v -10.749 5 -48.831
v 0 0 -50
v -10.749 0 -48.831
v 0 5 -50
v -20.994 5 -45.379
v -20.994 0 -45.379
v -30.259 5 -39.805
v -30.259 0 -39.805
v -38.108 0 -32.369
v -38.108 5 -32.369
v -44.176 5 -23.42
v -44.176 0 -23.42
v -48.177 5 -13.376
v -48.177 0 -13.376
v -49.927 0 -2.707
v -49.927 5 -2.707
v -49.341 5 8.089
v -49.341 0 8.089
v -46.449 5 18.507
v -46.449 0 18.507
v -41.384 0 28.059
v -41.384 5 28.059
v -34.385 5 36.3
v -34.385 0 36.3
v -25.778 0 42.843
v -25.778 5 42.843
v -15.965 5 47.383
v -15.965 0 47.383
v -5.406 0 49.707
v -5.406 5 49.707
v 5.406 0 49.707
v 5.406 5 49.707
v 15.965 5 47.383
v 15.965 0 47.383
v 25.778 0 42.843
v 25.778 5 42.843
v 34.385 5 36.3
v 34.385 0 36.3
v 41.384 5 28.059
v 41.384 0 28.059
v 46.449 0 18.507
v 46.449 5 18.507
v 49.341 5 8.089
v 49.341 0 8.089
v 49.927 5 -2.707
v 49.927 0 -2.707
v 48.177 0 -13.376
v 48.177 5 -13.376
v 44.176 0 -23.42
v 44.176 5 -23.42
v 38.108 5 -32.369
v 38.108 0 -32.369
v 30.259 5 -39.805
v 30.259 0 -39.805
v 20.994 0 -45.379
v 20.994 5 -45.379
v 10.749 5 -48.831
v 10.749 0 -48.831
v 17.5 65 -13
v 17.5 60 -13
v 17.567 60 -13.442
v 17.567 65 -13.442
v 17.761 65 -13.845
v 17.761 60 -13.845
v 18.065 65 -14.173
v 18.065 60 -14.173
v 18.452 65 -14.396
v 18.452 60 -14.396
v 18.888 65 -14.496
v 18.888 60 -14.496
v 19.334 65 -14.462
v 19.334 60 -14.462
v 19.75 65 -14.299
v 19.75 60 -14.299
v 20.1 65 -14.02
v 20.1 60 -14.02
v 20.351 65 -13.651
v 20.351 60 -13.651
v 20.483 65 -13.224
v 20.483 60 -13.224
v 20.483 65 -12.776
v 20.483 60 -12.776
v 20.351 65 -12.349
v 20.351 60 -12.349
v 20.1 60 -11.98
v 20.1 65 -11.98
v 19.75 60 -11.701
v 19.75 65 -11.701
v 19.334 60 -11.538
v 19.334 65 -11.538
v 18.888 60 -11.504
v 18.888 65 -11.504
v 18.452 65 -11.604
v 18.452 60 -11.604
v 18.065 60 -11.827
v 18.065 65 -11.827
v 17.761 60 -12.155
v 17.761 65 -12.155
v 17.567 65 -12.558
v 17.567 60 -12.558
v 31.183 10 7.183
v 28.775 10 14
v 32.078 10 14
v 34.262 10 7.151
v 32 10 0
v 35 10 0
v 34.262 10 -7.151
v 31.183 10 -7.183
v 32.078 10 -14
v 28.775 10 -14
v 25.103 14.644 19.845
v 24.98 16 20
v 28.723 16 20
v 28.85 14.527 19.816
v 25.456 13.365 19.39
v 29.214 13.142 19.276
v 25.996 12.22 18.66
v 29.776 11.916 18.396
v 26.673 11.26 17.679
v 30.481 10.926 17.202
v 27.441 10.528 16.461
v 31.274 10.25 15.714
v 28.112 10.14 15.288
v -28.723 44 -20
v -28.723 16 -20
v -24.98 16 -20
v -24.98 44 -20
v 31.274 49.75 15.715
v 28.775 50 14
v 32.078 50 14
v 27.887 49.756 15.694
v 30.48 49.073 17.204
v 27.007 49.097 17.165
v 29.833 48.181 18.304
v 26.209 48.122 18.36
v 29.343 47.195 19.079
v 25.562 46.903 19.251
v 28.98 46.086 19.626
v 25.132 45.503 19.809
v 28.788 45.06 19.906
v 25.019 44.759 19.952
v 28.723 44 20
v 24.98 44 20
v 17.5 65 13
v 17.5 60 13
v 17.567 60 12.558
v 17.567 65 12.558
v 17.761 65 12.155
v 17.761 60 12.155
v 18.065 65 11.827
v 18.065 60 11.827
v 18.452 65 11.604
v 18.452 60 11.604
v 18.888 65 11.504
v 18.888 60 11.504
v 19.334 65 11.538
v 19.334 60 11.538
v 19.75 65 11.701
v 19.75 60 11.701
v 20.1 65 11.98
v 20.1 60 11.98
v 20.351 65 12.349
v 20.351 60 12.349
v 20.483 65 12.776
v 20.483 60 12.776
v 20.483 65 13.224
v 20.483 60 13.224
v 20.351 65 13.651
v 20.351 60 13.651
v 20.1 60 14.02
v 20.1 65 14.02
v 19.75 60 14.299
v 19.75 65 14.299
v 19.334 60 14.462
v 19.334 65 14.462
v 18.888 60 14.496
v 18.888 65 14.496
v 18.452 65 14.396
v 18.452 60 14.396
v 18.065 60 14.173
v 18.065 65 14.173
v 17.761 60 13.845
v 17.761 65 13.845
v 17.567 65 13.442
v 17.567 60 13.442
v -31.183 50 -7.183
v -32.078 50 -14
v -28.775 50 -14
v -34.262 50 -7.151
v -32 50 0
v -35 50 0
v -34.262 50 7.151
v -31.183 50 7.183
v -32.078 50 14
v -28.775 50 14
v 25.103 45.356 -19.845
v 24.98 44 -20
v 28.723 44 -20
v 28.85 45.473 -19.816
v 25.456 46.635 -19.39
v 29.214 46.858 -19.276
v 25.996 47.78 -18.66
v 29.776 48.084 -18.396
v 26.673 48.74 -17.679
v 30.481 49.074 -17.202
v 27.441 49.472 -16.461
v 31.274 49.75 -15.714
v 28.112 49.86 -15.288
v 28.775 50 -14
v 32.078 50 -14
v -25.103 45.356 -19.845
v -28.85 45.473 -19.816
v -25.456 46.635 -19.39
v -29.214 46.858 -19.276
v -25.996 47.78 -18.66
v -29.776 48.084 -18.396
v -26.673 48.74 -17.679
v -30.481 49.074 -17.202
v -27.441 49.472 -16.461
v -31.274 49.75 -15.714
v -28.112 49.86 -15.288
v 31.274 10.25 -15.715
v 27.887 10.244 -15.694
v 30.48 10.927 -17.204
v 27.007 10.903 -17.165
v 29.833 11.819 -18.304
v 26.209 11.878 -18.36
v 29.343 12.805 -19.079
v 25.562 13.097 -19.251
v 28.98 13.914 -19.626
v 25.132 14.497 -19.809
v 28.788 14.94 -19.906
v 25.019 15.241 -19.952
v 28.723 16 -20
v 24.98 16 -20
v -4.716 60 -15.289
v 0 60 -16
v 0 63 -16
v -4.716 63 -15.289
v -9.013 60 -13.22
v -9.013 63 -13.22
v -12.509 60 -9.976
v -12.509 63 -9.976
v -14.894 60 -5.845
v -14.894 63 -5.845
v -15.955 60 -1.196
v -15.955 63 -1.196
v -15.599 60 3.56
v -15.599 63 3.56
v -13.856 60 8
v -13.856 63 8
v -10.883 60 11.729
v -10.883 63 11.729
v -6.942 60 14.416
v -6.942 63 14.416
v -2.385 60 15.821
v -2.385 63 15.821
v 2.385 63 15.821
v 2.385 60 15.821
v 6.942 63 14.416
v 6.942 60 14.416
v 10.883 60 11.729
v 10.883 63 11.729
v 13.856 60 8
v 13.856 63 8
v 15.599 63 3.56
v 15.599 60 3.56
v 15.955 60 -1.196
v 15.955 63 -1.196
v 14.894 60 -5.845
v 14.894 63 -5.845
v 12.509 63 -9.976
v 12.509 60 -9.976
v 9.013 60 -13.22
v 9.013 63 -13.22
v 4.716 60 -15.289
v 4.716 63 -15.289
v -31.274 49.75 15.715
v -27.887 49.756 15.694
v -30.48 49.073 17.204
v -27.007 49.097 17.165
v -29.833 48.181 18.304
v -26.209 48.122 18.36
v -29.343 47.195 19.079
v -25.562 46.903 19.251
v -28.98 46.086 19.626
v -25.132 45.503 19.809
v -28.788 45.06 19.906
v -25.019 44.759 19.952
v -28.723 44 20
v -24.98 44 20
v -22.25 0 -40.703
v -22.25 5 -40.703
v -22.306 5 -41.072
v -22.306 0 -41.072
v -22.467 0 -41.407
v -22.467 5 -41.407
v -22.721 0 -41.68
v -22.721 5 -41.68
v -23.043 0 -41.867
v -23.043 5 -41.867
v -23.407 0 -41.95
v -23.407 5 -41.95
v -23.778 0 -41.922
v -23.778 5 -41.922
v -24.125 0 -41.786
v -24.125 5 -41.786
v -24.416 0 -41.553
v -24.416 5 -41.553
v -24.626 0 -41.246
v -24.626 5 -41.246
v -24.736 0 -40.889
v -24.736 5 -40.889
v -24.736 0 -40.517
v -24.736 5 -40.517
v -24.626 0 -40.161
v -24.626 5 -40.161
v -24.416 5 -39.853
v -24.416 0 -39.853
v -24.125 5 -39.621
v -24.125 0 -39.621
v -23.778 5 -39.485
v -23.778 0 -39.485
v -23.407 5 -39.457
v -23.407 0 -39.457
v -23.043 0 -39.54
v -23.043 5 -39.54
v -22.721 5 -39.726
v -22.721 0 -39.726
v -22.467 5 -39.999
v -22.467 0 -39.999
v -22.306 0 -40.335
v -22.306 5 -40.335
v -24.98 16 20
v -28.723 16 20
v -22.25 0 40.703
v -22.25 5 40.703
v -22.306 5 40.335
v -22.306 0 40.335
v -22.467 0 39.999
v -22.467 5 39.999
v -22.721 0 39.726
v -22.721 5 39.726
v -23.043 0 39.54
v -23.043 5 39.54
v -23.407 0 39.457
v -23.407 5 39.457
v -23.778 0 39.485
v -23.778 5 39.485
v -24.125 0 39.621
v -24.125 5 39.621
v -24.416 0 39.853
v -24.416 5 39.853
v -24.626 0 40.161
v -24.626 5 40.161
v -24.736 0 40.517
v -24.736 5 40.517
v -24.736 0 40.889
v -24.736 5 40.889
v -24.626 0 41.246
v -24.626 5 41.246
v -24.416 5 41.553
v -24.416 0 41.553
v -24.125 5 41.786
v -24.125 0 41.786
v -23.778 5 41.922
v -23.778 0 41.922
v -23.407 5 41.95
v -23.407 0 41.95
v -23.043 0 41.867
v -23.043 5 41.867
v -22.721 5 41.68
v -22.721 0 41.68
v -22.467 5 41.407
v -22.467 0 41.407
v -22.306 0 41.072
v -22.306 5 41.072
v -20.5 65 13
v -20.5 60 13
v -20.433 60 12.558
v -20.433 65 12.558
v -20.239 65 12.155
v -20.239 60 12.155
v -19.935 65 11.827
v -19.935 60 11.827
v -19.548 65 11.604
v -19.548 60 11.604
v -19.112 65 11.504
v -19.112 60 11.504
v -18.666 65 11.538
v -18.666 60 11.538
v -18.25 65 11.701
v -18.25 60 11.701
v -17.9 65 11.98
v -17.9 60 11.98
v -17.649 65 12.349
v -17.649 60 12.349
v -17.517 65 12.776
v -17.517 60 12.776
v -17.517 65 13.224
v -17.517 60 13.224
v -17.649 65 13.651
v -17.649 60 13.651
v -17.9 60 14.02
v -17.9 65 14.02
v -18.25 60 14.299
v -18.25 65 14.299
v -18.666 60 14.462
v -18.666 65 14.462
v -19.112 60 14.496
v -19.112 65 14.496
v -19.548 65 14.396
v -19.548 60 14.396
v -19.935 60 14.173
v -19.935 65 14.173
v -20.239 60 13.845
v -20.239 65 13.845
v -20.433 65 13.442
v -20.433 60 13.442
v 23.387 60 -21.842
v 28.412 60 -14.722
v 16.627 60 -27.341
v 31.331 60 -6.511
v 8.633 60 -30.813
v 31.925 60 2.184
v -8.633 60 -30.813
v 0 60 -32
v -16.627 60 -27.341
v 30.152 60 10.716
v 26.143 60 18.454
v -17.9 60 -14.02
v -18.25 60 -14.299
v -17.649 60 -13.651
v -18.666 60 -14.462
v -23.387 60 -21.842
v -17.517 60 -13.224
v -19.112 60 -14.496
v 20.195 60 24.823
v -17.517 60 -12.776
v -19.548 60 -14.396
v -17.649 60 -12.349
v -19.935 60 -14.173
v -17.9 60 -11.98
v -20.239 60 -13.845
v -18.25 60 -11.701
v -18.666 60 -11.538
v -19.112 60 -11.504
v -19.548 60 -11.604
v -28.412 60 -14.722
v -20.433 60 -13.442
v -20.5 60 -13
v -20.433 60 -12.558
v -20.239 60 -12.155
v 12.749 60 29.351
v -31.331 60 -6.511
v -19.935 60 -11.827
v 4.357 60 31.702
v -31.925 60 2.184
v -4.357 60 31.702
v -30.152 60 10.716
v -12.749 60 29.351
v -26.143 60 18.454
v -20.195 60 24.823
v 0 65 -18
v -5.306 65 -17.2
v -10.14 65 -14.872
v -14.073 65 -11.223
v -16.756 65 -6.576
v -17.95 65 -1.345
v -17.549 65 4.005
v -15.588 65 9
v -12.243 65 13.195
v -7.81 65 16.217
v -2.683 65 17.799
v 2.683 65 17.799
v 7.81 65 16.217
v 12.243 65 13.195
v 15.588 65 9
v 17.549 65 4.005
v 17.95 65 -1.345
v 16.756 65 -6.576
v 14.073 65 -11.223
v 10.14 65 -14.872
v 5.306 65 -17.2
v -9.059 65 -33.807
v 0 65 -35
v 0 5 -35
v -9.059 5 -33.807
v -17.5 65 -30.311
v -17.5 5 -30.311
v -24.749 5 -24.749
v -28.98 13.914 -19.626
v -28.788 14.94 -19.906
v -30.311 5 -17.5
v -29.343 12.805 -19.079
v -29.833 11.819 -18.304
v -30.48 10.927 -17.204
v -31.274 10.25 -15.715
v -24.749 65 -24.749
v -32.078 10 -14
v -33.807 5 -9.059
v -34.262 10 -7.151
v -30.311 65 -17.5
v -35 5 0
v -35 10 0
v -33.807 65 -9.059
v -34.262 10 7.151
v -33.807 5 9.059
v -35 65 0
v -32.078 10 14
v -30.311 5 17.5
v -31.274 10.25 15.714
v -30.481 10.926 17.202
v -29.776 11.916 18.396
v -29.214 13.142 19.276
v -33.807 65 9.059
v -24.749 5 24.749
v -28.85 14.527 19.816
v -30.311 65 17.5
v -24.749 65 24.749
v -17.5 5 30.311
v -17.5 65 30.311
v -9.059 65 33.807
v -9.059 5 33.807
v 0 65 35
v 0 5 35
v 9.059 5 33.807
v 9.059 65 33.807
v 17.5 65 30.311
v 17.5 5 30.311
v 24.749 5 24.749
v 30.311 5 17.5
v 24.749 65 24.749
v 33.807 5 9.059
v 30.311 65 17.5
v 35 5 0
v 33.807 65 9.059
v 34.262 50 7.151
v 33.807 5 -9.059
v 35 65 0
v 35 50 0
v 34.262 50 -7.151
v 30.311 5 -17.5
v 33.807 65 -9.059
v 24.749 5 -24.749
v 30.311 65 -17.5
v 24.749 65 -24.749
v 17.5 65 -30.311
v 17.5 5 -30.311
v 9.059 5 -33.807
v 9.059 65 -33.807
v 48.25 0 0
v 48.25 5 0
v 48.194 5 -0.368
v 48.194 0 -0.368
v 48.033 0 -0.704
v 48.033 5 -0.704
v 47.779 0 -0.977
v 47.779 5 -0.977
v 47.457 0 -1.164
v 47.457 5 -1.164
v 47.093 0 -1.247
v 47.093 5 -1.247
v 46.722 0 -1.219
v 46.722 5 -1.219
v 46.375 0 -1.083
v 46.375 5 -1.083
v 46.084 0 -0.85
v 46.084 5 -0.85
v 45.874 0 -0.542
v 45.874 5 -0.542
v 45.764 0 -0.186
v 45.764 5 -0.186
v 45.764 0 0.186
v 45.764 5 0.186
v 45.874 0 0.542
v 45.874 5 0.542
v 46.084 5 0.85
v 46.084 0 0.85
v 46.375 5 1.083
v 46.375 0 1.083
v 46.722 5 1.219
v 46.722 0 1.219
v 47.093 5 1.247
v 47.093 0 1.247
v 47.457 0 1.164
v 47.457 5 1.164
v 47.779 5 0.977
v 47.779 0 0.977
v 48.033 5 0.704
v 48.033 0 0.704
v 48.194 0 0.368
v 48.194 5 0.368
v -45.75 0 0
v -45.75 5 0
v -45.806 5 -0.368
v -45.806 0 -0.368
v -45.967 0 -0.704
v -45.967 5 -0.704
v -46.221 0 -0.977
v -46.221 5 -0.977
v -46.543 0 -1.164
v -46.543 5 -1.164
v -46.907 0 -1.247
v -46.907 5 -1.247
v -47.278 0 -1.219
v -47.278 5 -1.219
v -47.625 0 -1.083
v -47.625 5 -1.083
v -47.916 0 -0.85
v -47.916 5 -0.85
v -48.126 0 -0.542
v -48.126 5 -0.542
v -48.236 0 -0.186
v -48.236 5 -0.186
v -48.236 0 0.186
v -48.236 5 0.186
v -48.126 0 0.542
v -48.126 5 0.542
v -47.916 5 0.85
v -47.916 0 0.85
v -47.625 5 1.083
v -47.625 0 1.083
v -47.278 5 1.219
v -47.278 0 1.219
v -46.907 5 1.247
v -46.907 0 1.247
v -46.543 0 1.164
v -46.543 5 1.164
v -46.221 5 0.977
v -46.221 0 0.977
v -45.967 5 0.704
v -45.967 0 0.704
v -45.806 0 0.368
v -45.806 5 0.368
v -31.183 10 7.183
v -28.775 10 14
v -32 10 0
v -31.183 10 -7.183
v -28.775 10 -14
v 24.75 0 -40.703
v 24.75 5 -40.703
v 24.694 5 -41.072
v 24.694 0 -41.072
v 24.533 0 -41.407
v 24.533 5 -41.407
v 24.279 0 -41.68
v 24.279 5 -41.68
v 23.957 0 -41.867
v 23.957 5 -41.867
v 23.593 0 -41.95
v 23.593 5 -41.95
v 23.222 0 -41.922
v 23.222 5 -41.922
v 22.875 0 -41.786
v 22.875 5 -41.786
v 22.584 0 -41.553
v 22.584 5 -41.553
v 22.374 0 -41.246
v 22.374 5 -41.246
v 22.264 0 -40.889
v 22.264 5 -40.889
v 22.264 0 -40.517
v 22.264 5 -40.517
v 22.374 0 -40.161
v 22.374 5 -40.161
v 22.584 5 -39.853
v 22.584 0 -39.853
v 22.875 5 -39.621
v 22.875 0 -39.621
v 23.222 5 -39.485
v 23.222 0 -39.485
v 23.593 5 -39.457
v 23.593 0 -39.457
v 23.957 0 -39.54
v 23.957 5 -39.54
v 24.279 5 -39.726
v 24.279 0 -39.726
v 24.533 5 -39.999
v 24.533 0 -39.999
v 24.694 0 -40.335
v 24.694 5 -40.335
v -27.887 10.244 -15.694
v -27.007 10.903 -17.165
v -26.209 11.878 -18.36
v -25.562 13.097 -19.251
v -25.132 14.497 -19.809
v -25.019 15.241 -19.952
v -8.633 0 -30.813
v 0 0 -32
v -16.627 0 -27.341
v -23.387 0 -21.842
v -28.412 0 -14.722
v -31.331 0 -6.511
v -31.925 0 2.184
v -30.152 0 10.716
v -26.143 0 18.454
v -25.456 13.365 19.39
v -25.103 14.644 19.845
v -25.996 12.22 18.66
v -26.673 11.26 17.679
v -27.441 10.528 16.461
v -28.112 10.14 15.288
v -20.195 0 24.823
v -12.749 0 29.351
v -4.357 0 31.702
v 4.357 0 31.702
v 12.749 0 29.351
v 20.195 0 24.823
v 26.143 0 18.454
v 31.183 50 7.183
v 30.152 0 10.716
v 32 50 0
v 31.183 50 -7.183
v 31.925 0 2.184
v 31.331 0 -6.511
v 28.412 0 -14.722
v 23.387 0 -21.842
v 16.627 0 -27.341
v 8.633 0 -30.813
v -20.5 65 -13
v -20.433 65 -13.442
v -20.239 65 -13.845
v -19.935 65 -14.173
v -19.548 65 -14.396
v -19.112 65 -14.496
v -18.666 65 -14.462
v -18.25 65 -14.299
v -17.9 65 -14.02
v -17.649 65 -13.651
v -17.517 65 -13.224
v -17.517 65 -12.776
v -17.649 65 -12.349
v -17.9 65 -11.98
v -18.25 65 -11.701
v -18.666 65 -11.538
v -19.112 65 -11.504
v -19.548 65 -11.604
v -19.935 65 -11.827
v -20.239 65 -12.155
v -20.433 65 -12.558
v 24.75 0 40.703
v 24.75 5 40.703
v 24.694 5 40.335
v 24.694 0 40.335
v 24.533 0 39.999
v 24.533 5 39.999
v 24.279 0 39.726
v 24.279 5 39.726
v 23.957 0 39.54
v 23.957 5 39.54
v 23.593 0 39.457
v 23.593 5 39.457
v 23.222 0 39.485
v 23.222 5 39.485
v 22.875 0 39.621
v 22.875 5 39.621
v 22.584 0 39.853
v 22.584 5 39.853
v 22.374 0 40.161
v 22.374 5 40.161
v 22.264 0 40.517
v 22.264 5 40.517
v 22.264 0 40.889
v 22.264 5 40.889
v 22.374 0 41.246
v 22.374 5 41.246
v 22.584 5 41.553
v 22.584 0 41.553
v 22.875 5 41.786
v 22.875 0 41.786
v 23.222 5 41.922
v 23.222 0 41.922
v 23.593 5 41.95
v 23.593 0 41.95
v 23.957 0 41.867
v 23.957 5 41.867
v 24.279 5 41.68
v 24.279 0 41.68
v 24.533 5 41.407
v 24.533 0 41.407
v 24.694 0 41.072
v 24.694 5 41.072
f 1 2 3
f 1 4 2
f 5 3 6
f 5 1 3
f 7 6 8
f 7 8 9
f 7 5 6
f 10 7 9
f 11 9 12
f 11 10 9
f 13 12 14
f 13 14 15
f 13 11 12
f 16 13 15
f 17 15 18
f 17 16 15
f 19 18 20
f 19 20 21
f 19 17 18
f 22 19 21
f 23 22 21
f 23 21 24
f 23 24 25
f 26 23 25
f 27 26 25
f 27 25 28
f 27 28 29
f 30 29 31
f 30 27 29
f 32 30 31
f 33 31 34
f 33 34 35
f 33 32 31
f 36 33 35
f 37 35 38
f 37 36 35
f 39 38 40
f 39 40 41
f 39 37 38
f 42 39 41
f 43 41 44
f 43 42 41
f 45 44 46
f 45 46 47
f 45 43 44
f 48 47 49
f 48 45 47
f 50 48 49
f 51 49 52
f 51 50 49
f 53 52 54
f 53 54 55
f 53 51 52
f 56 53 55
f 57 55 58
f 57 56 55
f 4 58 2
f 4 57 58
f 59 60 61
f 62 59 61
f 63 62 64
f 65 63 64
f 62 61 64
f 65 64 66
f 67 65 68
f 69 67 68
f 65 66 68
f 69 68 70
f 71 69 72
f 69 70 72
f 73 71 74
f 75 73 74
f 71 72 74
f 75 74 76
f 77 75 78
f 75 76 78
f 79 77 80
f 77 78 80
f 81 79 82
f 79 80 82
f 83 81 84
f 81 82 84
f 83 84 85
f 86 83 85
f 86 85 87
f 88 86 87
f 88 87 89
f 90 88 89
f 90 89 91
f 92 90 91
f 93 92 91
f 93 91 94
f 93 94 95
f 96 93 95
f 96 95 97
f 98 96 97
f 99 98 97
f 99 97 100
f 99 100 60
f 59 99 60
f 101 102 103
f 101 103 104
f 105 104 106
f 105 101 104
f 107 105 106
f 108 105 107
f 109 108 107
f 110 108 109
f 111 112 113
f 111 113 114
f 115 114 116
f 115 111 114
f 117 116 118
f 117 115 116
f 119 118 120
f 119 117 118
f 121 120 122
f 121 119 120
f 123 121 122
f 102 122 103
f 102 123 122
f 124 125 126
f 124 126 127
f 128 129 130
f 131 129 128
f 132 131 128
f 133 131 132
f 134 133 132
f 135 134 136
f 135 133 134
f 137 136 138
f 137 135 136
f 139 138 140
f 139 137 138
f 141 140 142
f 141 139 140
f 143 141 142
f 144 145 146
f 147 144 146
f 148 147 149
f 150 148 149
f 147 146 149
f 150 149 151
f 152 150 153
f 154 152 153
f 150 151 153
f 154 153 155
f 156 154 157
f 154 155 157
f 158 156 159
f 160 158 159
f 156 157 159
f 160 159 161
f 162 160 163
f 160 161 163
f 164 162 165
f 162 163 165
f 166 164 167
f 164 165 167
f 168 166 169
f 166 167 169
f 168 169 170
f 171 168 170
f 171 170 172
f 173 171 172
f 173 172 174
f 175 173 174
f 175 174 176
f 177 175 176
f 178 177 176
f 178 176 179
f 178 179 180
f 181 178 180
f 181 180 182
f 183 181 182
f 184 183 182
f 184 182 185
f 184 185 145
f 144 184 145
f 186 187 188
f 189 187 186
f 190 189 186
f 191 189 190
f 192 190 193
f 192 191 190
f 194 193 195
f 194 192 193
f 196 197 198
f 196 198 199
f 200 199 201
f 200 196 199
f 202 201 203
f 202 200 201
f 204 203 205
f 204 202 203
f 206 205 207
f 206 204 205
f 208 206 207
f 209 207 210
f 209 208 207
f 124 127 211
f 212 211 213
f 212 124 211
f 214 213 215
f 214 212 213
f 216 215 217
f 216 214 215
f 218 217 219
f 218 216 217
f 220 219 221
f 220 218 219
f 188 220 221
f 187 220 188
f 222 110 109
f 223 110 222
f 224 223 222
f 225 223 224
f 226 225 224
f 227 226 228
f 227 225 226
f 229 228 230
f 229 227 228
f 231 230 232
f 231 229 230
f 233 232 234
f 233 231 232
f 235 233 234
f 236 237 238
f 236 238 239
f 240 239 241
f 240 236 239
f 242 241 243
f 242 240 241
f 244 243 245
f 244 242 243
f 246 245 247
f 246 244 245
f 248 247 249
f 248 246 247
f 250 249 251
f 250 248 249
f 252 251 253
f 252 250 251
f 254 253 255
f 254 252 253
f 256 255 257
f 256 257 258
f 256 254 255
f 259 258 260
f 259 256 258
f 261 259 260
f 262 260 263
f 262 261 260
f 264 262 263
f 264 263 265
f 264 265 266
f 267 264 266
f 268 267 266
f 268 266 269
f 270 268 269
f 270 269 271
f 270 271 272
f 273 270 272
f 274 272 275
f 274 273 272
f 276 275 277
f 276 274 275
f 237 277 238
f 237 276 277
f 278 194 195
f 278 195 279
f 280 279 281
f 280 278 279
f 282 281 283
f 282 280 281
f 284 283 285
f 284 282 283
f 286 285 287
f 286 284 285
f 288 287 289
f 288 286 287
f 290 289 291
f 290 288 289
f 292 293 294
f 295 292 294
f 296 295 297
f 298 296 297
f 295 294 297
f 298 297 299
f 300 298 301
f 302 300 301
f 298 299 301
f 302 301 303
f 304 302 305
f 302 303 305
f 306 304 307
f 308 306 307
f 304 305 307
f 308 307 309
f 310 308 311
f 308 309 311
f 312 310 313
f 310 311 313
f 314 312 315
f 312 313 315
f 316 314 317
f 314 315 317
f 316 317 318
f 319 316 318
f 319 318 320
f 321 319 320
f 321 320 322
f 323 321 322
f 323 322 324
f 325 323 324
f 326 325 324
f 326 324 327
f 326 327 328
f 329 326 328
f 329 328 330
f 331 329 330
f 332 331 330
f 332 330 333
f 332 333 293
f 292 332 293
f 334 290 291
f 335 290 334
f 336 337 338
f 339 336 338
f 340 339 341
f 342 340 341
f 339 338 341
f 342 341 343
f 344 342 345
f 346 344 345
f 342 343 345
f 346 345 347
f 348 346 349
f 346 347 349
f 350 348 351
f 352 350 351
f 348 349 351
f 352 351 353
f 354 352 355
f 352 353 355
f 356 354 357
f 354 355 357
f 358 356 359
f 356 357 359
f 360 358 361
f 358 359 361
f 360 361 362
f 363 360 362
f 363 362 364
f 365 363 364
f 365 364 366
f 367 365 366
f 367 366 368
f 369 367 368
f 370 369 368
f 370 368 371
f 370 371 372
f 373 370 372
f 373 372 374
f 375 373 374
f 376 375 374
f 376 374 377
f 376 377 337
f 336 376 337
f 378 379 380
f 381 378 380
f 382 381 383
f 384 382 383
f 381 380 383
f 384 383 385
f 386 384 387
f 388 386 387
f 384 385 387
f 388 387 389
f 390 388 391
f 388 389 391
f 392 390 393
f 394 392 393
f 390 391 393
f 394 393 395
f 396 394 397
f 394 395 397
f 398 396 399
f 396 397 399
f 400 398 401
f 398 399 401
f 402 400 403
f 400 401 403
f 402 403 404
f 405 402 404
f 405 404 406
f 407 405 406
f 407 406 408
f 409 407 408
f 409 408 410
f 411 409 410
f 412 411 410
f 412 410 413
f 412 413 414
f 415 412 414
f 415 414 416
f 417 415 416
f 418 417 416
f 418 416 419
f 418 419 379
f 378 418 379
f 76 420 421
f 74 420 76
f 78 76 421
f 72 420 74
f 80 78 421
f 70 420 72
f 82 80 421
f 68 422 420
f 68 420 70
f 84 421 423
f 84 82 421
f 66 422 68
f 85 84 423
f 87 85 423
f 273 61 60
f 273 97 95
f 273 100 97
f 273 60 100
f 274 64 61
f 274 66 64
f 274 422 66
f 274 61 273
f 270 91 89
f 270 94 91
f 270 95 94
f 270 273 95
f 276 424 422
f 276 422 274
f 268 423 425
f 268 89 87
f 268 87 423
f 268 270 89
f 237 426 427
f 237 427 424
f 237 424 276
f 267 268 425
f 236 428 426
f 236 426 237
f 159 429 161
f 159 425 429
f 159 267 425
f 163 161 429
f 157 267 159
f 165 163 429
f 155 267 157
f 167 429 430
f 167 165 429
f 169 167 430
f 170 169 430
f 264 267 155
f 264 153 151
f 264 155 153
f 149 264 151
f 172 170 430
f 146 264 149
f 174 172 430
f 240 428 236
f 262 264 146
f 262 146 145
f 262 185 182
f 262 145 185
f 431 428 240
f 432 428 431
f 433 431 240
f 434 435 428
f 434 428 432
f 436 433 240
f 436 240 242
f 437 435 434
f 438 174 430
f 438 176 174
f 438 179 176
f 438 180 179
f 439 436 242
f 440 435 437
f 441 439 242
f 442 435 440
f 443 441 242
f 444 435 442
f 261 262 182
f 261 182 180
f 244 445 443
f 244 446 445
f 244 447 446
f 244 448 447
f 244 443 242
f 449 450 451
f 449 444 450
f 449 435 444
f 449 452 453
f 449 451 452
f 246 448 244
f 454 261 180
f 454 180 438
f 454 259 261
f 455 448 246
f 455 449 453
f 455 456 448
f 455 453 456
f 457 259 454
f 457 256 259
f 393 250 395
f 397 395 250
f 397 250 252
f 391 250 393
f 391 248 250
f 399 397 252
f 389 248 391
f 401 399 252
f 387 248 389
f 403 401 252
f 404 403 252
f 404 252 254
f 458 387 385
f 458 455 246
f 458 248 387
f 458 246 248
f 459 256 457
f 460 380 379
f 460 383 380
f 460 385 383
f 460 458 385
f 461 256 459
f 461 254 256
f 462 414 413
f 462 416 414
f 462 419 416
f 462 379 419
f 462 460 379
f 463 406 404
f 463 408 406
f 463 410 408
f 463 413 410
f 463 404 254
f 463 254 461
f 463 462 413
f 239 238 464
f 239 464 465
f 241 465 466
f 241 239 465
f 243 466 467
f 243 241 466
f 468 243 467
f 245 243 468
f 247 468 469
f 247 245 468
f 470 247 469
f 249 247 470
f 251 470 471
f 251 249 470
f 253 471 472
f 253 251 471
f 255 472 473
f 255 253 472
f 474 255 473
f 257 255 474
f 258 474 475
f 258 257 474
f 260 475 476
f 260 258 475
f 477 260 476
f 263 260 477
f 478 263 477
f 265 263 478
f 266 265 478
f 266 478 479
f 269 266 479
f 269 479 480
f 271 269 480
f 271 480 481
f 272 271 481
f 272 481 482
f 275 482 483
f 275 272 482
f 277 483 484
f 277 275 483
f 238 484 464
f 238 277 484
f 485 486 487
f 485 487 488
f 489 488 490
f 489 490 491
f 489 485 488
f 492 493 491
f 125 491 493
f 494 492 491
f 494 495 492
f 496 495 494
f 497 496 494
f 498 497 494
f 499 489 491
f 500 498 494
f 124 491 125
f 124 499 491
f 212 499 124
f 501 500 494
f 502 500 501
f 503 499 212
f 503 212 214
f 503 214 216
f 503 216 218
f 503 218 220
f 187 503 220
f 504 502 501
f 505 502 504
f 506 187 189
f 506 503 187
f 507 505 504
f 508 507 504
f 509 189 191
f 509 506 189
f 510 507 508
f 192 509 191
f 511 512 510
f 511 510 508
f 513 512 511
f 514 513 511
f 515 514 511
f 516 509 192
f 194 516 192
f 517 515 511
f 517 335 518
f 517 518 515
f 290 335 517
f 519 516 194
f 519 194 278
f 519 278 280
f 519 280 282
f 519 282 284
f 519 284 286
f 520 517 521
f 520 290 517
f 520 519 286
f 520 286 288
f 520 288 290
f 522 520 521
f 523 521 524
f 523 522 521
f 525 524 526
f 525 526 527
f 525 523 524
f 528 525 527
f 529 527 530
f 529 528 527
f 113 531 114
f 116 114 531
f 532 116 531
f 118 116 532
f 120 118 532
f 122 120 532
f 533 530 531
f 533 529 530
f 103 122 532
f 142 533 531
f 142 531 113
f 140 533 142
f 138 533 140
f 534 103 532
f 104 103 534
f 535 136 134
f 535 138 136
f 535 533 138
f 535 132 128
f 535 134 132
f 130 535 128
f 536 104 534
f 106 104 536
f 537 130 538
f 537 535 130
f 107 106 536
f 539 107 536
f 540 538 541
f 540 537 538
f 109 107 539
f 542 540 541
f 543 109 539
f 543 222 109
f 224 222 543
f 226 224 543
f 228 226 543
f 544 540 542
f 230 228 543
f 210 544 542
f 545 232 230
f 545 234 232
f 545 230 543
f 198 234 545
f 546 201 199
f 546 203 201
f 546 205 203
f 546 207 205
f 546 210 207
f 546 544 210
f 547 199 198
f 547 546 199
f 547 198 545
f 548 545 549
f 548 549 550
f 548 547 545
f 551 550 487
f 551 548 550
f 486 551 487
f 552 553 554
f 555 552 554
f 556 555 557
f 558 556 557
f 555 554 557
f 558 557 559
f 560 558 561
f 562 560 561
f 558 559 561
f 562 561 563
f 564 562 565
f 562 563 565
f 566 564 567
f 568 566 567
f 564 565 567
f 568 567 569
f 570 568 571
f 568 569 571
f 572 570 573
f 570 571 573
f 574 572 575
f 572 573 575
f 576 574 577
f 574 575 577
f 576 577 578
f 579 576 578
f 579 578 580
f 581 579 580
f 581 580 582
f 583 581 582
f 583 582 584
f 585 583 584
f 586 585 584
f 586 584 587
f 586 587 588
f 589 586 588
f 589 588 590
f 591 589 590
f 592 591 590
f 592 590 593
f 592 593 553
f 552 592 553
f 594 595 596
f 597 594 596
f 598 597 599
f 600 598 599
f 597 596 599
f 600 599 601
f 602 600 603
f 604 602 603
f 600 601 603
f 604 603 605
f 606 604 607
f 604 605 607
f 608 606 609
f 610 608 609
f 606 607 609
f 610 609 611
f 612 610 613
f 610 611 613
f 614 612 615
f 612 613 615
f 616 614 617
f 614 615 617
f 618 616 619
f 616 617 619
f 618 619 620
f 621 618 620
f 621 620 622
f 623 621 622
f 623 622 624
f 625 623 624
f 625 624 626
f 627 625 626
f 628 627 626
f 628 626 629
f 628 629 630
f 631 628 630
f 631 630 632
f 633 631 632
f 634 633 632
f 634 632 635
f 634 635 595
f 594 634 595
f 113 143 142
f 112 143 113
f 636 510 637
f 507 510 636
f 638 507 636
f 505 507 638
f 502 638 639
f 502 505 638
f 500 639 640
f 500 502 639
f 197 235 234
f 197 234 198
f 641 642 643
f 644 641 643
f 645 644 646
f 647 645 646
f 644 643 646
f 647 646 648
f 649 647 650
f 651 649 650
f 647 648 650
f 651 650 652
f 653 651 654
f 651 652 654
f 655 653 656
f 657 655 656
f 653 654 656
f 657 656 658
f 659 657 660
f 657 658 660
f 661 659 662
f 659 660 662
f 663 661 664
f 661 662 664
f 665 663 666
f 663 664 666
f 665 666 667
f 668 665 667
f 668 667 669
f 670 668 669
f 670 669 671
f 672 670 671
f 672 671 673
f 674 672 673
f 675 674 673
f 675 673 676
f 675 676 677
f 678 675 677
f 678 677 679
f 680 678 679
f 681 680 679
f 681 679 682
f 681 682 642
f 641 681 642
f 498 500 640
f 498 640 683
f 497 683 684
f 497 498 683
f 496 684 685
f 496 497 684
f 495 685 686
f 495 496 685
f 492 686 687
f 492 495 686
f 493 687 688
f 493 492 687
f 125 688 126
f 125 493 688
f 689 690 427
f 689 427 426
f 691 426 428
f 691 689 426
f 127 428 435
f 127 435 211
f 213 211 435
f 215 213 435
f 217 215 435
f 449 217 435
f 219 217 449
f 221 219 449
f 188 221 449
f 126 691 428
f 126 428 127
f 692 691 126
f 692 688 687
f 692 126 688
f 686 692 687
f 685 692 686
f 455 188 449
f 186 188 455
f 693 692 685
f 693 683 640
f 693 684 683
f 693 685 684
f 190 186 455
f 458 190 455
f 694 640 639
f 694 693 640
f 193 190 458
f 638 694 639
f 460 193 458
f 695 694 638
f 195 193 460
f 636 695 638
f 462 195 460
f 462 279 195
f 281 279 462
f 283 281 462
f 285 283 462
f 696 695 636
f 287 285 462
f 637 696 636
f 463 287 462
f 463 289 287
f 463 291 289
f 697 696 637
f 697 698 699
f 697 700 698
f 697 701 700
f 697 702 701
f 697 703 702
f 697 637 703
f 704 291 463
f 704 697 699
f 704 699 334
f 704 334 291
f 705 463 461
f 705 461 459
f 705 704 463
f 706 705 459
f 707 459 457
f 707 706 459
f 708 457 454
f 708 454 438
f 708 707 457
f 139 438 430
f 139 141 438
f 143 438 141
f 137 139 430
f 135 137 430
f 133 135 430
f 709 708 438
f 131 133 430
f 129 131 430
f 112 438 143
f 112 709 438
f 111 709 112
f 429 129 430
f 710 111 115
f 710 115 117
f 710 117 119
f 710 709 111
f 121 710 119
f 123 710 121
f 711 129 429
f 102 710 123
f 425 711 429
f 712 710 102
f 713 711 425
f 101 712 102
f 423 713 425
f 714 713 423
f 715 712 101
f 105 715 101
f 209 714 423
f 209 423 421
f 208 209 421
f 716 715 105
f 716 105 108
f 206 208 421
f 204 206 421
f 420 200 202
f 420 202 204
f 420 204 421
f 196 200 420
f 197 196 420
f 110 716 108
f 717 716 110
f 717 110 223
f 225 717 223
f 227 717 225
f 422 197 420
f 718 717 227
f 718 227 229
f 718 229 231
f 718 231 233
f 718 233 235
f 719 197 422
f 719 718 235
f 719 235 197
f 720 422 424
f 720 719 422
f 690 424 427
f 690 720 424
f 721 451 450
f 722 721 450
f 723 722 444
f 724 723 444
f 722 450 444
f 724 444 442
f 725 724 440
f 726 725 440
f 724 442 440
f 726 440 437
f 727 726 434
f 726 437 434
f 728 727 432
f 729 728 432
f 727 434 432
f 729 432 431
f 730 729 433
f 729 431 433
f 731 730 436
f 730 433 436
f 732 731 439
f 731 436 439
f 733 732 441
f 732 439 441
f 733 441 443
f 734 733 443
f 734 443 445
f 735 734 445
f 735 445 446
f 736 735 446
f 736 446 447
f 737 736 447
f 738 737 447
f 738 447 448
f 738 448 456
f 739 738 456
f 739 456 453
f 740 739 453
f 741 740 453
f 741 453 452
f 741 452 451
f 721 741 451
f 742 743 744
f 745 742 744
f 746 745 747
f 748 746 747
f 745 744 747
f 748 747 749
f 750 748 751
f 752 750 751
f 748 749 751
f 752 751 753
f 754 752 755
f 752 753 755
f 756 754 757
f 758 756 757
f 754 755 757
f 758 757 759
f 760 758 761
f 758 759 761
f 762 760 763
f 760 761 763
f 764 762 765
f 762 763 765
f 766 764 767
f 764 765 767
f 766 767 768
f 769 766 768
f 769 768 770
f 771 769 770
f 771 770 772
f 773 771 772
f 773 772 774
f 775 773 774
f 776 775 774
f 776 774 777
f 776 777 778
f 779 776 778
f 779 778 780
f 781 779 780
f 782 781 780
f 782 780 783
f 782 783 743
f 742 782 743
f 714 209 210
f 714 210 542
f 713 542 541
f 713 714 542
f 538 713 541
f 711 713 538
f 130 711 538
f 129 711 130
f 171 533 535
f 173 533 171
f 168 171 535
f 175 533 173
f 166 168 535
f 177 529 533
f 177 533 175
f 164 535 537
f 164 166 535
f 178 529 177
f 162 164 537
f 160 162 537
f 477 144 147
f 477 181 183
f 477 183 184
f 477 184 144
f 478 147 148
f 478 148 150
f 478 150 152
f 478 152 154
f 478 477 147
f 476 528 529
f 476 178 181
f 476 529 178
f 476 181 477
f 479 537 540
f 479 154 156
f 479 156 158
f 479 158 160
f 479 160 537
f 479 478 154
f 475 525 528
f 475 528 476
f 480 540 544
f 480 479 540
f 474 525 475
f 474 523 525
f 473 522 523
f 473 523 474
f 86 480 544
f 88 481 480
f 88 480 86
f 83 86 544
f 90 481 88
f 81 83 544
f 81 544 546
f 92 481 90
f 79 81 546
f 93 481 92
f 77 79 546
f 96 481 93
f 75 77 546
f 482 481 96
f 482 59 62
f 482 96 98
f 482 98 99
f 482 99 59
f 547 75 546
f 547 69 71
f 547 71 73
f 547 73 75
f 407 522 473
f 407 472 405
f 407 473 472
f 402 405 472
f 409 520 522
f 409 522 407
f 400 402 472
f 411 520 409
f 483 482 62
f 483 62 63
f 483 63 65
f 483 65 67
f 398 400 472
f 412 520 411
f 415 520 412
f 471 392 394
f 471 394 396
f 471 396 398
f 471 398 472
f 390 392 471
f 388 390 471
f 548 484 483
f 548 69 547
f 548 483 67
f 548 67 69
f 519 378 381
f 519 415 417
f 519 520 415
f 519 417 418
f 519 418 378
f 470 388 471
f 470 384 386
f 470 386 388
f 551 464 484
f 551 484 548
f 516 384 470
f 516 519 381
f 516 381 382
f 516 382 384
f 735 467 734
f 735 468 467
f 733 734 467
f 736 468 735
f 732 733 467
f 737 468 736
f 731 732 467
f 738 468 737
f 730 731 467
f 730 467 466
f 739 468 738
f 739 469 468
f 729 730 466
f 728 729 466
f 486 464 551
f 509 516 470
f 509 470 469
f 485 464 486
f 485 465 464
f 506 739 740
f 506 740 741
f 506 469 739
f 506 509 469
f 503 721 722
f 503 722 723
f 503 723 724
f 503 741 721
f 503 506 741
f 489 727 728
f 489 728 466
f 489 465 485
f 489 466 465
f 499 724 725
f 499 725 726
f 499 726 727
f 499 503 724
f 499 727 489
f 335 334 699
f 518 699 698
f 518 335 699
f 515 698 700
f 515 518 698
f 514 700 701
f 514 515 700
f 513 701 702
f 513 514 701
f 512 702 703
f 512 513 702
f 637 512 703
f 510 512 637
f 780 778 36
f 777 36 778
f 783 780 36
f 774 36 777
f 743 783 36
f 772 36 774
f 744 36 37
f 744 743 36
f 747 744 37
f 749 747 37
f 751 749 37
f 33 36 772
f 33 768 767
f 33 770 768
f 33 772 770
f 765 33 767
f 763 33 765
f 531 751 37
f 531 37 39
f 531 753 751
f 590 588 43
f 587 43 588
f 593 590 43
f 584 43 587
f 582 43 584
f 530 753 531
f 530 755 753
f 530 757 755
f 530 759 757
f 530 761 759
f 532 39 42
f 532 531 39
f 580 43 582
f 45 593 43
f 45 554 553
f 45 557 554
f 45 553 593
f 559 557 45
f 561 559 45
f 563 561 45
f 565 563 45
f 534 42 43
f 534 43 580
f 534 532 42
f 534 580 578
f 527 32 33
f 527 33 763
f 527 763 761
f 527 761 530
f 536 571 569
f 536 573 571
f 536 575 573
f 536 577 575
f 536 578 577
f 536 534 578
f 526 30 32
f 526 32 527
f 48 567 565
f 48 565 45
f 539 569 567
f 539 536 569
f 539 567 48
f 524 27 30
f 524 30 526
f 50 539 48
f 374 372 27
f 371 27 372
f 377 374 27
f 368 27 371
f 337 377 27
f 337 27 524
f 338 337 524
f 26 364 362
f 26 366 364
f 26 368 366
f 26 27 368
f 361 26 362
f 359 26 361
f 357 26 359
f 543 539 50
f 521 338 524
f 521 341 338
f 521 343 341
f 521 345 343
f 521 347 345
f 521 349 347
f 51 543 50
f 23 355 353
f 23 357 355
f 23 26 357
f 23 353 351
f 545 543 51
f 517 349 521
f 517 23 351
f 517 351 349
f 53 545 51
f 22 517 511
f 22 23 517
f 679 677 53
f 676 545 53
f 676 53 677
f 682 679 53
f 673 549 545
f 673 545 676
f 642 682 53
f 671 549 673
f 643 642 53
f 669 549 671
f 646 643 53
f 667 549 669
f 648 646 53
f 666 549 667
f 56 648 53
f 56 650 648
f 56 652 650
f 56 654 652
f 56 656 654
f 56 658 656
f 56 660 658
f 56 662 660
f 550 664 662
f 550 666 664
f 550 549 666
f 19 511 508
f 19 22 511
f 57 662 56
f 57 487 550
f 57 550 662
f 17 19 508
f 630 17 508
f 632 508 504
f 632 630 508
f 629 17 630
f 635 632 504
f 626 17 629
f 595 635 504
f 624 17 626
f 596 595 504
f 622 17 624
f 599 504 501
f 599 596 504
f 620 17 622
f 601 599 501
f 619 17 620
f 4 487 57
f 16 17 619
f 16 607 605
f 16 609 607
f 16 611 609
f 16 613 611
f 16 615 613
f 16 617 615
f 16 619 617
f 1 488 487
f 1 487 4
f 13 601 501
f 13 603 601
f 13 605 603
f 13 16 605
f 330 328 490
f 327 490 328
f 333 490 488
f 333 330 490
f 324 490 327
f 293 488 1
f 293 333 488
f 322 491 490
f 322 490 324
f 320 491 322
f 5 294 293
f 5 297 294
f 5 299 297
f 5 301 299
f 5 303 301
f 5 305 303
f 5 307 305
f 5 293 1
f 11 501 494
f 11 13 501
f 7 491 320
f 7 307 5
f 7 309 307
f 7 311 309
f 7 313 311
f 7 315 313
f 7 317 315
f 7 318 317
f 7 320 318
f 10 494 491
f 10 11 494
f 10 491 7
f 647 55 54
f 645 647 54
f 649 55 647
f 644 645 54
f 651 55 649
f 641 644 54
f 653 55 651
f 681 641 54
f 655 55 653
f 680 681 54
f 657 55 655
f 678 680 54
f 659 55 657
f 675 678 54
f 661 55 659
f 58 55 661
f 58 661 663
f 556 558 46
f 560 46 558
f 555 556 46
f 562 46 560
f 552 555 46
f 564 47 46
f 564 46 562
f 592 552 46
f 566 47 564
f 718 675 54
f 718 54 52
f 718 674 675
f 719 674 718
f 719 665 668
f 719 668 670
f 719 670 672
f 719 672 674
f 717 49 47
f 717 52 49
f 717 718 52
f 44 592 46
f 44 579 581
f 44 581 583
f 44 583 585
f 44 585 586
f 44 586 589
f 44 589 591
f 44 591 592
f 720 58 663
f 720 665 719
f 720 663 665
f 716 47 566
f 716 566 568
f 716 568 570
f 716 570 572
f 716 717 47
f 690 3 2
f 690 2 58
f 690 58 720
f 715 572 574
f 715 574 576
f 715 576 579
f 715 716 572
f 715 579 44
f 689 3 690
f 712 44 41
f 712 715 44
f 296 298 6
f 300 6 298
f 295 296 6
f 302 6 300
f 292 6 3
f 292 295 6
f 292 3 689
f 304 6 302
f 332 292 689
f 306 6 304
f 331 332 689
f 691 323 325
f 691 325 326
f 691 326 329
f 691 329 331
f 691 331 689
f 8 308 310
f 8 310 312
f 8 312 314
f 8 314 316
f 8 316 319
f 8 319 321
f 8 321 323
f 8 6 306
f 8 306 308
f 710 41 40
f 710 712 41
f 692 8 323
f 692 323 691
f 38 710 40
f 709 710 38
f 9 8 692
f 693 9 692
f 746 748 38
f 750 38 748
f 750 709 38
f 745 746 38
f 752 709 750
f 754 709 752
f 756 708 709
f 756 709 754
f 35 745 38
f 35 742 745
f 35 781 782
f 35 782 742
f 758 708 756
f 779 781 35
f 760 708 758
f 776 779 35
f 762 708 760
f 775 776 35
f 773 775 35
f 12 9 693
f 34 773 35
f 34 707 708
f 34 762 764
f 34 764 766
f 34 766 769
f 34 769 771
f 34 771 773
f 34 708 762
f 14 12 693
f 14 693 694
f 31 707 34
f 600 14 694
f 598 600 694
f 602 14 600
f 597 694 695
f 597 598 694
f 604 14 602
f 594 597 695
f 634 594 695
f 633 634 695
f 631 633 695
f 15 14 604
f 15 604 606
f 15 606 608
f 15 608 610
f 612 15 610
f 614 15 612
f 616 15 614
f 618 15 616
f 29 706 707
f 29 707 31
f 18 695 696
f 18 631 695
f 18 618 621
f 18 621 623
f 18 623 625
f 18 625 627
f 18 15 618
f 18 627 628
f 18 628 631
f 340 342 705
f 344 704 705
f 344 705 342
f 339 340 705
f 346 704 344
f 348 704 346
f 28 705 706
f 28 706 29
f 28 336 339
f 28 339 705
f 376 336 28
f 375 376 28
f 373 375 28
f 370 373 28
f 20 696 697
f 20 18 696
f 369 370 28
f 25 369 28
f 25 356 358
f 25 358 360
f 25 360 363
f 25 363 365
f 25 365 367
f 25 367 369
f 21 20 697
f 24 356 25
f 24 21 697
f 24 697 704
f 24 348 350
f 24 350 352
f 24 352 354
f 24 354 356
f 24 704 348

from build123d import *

# Parameters (mm, degrees)
CHAMFER_1_SIZE           = 2
HOLE_WIZARD_M3_1_D       = 3
CUT_EXTRUDE_1_DEPTH      = 97.046863561
CUT_EXTRUDE_1_DEPTH_BACK = 97.046863561
HOLE_WIZARD_M3_1_2_D     = 2.5


with BuildPart() as part:
    # 草图1 → 旋转1 (revolve)
    with BuildSketch(Plane(origin=(0, 0, 0), x_dir=(0, 0, -1), z_dir=(1, 0, 0))):
        Polygon((32, 0), (50, 0), (50, 5), (35, 5), (35, 65), (16, 65), (16, 60), (32, 60), align=None)
    revolve(axis=Axis((0, 0, 0), (0, 1, 0)))

    # 倒角1
    chamfer_1_edges = [part.edges().sort_by_distance(p)[0] for p in [
        (0, 65, 16),
    ]]
    chamfer(chamfer_1_edges, length=CHAMFER_1_SIZE)

    # Hole Wizard M3 _1 (through all)
    with Locations(Plane(origin=(0, 65, 0), x_dir=(1, 0, 0), z_dir=(0, 1, 0))):
        with Locations((19, -13), (-19, 13), (-19, -13), (19, 13)):
            Hole(HOLE_WIZARD_M3_1_D / 2)

    # 草图4 → 切除-拉伸1 (cut, two sides: drawn at the far end of the back side and taken through both)
    with BuildSketch(Plane(origin=(0, 0, 0), x_dir=(0, 0, -1), z_dir=(1, 0, 0)).offset(-CUT_EXTRUDE_1_DEPTH_BACK)):
        with BuildLine():
            Line((-14, 10), (14, 10))
            ThreePointArc((14, 10), (18.242640687, 11.757359313), (20, 16))
            Line((20, 16), (20, 44))
            ThreePointArc((20, 44), (18.242640687, 48.242640687), (14, 50))
            Line((14, 50), (-14, 50))
            ThreePointArc((-14, 50), (-18.242640687, 48.242640687), (-20, 44))
            Line((-20, 44), (-20, 16))
            ThreePointArc((-20, 16), (-18.242640687, 11.757359313), (-14, 10))
        make_face()
    extrude(amount=CUT_EXTRUDE_1_DEPTH + CUT_EXTRUDE_1_DEPTH_BACK, mode=Mode.SUBTRACT)

    # Hole Wizard M3 _1 2 (through all)
    with Locations(Plane(origin=(0, 0, 0), x_dir=(-1, 0, 0), z_dir=(0, -1, 0))):
        with Locations((47, 0), (23.5, -40.703193978), (-23.5, -40.703193978), (-47, 0), (-23.5, 40.703193978), (23.5, 40.703193978)):
            Hole(HOLE_WIZARD_M3_1_2_D / 2)


solid = part.part
